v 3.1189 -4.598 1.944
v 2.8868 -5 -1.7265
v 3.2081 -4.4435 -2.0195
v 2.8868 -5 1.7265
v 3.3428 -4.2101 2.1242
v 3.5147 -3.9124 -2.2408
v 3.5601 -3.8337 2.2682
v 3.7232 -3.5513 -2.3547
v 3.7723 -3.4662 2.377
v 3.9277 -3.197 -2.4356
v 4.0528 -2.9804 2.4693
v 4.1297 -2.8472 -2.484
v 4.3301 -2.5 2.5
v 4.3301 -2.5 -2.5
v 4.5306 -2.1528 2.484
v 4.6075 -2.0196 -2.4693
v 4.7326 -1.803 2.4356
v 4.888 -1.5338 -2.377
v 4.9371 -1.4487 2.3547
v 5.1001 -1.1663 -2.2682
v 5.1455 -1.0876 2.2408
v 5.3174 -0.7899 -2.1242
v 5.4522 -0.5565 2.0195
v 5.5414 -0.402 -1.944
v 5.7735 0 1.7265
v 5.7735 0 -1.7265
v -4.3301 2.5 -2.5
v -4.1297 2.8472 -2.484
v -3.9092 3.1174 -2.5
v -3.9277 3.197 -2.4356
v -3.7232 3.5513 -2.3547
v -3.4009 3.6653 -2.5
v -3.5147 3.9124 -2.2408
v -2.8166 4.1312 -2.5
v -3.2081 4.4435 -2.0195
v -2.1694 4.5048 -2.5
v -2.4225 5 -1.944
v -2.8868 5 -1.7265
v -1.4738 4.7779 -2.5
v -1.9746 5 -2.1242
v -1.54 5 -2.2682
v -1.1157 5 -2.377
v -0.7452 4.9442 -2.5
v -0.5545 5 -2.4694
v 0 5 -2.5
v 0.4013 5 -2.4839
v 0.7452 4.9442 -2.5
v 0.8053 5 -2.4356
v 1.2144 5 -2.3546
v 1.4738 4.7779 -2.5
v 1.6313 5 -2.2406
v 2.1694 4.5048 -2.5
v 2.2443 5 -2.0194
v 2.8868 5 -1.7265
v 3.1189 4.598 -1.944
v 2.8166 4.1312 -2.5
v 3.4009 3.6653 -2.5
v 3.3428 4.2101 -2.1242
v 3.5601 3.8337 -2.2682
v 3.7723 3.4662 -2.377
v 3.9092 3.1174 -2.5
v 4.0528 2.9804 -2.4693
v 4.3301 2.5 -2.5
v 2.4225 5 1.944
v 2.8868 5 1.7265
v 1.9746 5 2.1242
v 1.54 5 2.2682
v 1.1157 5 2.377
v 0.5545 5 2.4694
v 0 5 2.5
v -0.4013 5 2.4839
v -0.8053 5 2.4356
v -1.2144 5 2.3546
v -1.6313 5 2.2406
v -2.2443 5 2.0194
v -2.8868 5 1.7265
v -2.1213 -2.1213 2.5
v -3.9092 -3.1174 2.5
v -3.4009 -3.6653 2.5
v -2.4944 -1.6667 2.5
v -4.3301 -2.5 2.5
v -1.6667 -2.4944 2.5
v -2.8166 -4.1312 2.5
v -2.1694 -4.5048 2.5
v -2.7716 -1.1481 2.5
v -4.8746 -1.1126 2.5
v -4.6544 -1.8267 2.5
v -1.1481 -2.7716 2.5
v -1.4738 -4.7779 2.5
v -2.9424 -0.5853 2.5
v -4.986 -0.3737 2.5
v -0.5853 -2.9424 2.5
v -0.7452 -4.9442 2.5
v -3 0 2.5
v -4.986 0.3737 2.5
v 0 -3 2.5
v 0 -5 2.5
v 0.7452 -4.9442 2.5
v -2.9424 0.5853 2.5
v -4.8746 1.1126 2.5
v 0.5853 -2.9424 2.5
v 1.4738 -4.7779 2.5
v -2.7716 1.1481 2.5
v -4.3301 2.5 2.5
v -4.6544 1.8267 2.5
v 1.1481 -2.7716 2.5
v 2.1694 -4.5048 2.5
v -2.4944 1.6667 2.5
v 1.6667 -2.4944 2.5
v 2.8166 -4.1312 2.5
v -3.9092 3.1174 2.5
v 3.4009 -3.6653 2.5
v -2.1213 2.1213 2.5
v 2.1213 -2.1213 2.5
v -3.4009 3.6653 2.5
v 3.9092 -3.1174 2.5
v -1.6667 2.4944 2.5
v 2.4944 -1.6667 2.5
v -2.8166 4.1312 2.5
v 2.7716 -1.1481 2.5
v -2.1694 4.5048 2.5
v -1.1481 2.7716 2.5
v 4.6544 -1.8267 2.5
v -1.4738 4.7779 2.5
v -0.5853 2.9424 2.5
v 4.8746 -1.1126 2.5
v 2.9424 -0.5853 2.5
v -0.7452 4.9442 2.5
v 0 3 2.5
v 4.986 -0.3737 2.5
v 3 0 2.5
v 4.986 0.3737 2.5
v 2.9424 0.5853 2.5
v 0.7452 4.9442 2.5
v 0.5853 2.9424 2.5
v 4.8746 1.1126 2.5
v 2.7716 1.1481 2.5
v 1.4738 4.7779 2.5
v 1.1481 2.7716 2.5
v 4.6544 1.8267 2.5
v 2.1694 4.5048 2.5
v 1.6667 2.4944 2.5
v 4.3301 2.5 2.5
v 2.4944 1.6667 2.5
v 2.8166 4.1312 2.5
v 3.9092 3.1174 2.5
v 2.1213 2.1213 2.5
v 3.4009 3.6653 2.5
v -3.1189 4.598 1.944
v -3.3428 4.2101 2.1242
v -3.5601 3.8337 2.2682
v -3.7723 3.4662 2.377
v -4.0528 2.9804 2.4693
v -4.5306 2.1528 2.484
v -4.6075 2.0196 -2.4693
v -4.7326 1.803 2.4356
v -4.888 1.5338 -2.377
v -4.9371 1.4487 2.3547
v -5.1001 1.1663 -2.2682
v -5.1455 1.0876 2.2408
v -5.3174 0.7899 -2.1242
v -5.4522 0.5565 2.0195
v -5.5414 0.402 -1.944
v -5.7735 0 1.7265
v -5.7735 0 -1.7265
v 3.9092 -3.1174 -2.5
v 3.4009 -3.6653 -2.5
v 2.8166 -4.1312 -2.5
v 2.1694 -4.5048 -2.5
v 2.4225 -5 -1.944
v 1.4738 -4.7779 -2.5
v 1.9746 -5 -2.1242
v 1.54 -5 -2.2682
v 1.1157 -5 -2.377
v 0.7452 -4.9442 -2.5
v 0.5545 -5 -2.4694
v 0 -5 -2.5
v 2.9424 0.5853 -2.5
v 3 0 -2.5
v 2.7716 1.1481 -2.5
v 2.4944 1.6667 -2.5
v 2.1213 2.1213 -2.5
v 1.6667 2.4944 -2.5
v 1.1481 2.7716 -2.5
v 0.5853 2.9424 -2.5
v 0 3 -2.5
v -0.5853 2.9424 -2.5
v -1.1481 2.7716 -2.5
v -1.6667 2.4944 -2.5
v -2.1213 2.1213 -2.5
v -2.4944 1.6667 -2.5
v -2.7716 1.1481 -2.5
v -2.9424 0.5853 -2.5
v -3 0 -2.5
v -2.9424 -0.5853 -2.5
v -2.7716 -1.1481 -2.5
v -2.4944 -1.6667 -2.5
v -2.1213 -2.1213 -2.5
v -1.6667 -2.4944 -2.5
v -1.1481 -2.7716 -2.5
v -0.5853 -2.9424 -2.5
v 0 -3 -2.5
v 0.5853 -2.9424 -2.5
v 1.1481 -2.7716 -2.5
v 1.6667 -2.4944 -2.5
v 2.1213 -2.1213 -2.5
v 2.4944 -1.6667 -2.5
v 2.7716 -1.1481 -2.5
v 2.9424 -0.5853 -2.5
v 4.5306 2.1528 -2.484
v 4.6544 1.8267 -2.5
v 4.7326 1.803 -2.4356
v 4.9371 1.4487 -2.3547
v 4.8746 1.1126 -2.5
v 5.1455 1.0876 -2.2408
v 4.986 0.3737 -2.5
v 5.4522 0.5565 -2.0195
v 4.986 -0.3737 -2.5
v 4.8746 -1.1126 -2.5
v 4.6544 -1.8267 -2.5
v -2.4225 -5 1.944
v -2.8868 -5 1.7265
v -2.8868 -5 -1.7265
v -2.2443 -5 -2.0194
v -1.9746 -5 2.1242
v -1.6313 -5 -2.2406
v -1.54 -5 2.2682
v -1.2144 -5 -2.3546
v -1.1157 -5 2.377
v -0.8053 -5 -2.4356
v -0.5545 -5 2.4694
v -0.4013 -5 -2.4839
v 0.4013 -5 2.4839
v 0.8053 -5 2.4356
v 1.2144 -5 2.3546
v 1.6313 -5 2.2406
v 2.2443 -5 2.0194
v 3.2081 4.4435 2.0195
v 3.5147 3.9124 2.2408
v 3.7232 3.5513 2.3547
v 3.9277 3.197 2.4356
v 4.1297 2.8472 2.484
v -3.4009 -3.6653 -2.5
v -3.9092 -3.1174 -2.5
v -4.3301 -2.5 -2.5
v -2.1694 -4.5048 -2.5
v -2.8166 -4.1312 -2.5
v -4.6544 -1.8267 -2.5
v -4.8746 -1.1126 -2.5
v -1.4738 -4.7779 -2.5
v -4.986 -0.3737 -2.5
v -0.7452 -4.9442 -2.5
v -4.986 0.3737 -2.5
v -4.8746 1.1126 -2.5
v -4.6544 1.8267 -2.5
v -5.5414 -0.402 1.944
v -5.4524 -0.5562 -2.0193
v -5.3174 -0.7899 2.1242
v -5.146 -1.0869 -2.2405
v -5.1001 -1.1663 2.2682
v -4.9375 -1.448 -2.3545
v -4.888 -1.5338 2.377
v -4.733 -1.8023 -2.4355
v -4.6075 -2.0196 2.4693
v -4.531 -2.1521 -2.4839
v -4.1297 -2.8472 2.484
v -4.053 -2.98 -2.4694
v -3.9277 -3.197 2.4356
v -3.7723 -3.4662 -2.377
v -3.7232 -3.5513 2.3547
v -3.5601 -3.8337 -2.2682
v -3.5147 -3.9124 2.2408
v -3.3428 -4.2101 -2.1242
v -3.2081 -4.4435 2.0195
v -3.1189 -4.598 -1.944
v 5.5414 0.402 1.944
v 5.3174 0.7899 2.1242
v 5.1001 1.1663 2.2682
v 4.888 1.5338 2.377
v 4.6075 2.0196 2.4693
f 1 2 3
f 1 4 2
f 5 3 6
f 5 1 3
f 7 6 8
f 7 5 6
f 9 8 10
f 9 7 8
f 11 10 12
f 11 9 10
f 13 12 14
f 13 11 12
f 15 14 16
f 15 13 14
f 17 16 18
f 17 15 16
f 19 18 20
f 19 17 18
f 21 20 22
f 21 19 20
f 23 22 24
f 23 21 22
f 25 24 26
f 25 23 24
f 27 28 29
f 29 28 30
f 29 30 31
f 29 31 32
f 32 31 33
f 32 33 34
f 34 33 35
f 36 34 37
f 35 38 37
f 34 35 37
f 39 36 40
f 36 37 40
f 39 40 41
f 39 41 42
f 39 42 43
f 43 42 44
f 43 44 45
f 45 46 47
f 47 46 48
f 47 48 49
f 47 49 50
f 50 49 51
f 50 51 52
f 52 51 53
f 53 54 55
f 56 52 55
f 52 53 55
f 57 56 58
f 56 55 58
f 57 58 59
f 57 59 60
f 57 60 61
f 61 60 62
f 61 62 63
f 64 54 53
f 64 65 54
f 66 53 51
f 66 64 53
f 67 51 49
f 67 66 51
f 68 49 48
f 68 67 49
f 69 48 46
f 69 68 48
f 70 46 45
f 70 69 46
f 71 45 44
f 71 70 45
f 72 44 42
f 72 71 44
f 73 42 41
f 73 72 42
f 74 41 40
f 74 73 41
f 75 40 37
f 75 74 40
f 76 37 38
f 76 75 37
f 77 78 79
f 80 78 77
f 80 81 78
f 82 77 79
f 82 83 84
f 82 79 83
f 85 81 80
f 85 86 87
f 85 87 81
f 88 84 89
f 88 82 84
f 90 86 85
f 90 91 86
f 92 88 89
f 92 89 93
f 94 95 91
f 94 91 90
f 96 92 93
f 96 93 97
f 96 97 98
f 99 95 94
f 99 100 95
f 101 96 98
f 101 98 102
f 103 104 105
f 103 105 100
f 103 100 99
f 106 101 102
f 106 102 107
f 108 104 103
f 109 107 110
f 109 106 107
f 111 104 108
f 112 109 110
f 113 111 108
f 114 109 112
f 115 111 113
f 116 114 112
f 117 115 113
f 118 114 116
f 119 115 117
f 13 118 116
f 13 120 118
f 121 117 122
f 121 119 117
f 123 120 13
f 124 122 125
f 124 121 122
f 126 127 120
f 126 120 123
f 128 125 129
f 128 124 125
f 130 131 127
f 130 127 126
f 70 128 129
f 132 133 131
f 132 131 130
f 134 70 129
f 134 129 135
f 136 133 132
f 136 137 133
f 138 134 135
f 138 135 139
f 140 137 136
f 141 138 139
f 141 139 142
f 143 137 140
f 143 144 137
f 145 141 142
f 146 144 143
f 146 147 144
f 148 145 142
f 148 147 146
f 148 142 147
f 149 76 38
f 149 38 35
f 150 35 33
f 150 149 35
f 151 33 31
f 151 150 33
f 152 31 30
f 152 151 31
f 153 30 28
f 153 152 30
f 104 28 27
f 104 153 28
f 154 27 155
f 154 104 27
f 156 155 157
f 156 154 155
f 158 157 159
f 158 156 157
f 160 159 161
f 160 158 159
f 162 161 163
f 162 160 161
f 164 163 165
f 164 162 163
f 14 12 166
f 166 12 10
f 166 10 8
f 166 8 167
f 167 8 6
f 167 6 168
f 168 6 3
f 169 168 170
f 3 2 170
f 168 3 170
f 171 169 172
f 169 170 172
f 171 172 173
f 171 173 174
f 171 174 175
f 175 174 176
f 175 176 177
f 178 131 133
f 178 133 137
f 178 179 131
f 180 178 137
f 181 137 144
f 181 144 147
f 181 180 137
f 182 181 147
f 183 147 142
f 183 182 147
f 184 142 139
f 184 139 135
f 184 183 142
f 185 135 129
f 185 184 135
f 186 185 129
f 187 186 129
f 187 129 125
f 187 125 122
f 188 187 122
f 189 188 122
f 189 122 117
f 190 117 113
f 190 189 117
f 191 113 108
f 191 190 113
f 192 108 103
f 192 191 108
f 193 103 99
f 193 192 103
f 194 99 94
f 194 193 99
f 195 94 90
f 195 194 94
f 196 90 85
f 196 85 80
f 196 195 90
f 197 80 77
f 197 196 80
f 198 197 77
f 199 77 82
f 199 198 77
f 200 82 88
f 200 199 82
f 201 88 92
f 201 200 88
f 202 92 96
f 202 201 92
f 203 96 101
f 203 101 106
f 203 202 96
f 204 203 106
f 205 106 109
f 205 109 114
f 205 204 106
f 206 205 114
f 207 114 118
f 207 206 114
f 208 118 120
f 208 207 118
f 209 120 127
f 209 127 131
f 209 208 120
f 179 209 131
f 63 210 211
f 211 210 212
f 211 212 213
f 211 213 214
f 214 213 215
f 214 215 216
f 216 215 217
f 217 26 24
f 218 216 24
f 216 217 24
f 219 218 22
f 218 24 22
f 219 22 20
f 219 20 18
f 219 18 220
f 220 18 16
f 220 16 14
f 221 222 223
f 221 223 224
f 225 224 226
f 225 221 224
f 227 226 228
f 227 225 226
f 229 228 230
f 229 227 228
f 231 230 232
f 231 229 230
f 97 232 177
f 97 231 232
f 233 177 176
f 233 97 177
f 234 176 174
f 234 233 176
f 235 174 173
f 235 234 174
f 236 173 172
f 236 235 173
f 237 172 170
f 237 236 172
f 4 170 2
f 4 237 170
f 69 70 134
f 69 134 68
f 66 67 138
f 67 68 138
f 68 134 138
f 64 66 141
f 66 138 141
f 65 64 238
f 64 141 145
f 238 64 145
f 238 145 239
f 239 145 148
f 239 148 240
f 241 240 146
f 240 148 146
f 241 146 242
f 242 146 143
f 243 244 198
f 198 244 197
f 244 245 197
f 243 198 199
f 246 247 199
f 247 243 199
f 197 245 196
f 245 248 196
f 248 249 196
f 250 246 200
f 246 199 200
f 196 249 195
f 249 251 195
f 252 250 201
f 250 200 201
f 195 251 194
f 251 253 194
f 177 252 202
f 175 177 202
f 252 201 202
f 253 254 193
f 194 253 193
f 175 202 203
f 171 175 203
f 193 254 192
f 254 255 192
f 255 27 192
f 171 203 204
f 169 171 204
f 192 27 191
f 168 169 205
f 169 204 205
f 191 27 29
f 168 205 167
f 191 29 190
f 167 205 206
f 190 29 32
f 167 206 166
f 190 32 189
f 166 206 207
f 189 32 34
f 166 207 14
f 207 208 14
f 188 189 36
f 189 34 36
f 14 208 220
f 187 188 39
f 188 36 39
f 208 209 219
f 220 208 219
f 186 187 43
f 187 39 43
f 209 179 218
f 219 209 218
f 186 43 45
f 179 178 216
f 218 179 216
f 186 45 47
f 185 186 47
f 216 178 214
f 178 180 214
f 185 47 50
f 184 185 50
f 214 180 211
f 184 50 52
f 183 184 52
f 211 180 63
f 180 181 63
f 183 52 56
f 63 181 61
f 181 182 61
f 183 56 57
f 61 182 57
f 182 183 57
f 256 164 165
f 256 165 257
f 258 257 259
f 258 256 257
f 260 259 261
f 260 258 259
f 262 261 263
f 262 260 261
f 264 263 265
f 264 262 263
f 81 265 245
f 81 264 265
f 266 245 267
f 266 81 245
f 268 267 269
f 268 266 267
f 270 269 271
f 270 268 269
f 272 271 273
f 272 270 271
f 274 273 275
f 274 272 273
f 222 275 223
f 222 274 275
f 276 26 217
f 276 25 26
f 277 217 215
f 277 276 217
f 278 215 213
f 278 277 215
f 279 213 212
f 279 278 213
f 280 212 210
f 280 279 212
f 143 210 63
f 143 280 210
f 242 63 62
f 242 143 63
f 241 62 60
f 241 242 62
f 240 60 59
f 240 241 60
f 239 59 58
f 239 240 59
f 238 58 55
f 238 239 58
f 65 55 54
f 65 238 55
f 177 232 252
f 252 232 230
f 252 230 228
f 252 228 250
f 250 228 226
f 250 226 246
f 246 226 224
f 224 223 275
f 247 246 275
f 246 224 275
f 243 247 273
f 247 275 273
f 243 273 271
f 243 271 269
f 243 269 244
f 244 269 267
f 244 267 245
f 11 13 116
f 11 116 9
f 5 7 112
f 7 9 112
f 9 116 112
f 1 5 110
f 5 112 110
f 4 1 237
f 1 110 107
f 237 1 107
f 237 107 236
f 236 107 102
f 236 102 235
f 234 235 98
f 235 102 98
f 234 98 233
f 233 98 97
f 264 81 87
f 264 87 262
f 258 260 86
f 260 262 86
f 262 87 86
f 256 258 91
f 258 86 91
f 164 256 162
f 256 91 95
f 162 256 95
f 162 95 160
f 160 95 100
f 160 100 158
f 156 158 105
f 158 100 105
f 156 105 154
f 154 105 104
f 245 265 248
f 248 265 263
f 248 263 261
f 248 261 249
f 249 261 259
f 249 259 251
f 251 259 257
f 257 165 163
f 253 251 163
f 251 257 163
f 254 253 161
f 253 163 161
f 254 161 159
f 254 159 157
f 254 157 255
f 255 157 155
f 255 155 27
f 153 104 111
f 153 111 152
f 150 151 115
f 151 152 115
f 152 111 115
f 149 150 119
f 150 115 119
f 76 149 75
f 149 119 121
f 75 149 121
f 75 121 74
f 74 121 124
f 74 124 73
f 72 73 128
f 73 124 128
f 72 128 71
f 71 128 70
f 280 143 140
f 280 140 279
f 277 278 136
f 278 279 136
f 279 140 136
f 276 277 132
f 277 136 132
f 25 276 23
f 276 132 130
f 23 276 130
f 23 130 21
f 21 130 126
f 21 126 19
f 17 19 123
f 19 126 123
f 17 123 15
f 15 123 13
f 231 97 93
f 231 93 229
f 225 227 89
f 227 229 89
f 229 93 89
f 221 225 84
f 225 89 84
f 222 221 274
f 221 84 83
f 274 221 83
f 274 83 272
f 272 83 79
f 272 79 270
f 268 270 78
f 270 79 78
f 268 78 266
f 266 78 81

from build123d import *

# Parameters (mm, degrees)
F0_R     = 3
F1_DEPTH = 2.5


with BuildPart() as f1:
    # F0 (on Top) → F1 (new body, symmetric)
    with BuildSketch(Plane.XY):
        Polygon((2.886751, 5), (-2.886751, 5), (-5.773503, 0), (-2.886751, -5), (2.886751, -5), (5.773503, 0), align=None)
        Circle(F0_R, mode=Mode.SUBTRACT)
    extrude(amount=F1_DEPTH, both=True)

    # F2 (on Front) → F3 (revolve, cut)
    with BuildSketch(Plane.XZ):
        Polygon((-5.773503, 2.5), (-5.773503, 1.726497), (-5, 2.5), align=None)
        Polygon((-5, -2.5), (-5.773503, -1.726497), (-5.773503, -2.5), align=None)
    revolve(axis=Axis((0, 0, -0.060454), (0, 0, -1)), mode=Mode.SUBTRACT)


solid = f1.part
